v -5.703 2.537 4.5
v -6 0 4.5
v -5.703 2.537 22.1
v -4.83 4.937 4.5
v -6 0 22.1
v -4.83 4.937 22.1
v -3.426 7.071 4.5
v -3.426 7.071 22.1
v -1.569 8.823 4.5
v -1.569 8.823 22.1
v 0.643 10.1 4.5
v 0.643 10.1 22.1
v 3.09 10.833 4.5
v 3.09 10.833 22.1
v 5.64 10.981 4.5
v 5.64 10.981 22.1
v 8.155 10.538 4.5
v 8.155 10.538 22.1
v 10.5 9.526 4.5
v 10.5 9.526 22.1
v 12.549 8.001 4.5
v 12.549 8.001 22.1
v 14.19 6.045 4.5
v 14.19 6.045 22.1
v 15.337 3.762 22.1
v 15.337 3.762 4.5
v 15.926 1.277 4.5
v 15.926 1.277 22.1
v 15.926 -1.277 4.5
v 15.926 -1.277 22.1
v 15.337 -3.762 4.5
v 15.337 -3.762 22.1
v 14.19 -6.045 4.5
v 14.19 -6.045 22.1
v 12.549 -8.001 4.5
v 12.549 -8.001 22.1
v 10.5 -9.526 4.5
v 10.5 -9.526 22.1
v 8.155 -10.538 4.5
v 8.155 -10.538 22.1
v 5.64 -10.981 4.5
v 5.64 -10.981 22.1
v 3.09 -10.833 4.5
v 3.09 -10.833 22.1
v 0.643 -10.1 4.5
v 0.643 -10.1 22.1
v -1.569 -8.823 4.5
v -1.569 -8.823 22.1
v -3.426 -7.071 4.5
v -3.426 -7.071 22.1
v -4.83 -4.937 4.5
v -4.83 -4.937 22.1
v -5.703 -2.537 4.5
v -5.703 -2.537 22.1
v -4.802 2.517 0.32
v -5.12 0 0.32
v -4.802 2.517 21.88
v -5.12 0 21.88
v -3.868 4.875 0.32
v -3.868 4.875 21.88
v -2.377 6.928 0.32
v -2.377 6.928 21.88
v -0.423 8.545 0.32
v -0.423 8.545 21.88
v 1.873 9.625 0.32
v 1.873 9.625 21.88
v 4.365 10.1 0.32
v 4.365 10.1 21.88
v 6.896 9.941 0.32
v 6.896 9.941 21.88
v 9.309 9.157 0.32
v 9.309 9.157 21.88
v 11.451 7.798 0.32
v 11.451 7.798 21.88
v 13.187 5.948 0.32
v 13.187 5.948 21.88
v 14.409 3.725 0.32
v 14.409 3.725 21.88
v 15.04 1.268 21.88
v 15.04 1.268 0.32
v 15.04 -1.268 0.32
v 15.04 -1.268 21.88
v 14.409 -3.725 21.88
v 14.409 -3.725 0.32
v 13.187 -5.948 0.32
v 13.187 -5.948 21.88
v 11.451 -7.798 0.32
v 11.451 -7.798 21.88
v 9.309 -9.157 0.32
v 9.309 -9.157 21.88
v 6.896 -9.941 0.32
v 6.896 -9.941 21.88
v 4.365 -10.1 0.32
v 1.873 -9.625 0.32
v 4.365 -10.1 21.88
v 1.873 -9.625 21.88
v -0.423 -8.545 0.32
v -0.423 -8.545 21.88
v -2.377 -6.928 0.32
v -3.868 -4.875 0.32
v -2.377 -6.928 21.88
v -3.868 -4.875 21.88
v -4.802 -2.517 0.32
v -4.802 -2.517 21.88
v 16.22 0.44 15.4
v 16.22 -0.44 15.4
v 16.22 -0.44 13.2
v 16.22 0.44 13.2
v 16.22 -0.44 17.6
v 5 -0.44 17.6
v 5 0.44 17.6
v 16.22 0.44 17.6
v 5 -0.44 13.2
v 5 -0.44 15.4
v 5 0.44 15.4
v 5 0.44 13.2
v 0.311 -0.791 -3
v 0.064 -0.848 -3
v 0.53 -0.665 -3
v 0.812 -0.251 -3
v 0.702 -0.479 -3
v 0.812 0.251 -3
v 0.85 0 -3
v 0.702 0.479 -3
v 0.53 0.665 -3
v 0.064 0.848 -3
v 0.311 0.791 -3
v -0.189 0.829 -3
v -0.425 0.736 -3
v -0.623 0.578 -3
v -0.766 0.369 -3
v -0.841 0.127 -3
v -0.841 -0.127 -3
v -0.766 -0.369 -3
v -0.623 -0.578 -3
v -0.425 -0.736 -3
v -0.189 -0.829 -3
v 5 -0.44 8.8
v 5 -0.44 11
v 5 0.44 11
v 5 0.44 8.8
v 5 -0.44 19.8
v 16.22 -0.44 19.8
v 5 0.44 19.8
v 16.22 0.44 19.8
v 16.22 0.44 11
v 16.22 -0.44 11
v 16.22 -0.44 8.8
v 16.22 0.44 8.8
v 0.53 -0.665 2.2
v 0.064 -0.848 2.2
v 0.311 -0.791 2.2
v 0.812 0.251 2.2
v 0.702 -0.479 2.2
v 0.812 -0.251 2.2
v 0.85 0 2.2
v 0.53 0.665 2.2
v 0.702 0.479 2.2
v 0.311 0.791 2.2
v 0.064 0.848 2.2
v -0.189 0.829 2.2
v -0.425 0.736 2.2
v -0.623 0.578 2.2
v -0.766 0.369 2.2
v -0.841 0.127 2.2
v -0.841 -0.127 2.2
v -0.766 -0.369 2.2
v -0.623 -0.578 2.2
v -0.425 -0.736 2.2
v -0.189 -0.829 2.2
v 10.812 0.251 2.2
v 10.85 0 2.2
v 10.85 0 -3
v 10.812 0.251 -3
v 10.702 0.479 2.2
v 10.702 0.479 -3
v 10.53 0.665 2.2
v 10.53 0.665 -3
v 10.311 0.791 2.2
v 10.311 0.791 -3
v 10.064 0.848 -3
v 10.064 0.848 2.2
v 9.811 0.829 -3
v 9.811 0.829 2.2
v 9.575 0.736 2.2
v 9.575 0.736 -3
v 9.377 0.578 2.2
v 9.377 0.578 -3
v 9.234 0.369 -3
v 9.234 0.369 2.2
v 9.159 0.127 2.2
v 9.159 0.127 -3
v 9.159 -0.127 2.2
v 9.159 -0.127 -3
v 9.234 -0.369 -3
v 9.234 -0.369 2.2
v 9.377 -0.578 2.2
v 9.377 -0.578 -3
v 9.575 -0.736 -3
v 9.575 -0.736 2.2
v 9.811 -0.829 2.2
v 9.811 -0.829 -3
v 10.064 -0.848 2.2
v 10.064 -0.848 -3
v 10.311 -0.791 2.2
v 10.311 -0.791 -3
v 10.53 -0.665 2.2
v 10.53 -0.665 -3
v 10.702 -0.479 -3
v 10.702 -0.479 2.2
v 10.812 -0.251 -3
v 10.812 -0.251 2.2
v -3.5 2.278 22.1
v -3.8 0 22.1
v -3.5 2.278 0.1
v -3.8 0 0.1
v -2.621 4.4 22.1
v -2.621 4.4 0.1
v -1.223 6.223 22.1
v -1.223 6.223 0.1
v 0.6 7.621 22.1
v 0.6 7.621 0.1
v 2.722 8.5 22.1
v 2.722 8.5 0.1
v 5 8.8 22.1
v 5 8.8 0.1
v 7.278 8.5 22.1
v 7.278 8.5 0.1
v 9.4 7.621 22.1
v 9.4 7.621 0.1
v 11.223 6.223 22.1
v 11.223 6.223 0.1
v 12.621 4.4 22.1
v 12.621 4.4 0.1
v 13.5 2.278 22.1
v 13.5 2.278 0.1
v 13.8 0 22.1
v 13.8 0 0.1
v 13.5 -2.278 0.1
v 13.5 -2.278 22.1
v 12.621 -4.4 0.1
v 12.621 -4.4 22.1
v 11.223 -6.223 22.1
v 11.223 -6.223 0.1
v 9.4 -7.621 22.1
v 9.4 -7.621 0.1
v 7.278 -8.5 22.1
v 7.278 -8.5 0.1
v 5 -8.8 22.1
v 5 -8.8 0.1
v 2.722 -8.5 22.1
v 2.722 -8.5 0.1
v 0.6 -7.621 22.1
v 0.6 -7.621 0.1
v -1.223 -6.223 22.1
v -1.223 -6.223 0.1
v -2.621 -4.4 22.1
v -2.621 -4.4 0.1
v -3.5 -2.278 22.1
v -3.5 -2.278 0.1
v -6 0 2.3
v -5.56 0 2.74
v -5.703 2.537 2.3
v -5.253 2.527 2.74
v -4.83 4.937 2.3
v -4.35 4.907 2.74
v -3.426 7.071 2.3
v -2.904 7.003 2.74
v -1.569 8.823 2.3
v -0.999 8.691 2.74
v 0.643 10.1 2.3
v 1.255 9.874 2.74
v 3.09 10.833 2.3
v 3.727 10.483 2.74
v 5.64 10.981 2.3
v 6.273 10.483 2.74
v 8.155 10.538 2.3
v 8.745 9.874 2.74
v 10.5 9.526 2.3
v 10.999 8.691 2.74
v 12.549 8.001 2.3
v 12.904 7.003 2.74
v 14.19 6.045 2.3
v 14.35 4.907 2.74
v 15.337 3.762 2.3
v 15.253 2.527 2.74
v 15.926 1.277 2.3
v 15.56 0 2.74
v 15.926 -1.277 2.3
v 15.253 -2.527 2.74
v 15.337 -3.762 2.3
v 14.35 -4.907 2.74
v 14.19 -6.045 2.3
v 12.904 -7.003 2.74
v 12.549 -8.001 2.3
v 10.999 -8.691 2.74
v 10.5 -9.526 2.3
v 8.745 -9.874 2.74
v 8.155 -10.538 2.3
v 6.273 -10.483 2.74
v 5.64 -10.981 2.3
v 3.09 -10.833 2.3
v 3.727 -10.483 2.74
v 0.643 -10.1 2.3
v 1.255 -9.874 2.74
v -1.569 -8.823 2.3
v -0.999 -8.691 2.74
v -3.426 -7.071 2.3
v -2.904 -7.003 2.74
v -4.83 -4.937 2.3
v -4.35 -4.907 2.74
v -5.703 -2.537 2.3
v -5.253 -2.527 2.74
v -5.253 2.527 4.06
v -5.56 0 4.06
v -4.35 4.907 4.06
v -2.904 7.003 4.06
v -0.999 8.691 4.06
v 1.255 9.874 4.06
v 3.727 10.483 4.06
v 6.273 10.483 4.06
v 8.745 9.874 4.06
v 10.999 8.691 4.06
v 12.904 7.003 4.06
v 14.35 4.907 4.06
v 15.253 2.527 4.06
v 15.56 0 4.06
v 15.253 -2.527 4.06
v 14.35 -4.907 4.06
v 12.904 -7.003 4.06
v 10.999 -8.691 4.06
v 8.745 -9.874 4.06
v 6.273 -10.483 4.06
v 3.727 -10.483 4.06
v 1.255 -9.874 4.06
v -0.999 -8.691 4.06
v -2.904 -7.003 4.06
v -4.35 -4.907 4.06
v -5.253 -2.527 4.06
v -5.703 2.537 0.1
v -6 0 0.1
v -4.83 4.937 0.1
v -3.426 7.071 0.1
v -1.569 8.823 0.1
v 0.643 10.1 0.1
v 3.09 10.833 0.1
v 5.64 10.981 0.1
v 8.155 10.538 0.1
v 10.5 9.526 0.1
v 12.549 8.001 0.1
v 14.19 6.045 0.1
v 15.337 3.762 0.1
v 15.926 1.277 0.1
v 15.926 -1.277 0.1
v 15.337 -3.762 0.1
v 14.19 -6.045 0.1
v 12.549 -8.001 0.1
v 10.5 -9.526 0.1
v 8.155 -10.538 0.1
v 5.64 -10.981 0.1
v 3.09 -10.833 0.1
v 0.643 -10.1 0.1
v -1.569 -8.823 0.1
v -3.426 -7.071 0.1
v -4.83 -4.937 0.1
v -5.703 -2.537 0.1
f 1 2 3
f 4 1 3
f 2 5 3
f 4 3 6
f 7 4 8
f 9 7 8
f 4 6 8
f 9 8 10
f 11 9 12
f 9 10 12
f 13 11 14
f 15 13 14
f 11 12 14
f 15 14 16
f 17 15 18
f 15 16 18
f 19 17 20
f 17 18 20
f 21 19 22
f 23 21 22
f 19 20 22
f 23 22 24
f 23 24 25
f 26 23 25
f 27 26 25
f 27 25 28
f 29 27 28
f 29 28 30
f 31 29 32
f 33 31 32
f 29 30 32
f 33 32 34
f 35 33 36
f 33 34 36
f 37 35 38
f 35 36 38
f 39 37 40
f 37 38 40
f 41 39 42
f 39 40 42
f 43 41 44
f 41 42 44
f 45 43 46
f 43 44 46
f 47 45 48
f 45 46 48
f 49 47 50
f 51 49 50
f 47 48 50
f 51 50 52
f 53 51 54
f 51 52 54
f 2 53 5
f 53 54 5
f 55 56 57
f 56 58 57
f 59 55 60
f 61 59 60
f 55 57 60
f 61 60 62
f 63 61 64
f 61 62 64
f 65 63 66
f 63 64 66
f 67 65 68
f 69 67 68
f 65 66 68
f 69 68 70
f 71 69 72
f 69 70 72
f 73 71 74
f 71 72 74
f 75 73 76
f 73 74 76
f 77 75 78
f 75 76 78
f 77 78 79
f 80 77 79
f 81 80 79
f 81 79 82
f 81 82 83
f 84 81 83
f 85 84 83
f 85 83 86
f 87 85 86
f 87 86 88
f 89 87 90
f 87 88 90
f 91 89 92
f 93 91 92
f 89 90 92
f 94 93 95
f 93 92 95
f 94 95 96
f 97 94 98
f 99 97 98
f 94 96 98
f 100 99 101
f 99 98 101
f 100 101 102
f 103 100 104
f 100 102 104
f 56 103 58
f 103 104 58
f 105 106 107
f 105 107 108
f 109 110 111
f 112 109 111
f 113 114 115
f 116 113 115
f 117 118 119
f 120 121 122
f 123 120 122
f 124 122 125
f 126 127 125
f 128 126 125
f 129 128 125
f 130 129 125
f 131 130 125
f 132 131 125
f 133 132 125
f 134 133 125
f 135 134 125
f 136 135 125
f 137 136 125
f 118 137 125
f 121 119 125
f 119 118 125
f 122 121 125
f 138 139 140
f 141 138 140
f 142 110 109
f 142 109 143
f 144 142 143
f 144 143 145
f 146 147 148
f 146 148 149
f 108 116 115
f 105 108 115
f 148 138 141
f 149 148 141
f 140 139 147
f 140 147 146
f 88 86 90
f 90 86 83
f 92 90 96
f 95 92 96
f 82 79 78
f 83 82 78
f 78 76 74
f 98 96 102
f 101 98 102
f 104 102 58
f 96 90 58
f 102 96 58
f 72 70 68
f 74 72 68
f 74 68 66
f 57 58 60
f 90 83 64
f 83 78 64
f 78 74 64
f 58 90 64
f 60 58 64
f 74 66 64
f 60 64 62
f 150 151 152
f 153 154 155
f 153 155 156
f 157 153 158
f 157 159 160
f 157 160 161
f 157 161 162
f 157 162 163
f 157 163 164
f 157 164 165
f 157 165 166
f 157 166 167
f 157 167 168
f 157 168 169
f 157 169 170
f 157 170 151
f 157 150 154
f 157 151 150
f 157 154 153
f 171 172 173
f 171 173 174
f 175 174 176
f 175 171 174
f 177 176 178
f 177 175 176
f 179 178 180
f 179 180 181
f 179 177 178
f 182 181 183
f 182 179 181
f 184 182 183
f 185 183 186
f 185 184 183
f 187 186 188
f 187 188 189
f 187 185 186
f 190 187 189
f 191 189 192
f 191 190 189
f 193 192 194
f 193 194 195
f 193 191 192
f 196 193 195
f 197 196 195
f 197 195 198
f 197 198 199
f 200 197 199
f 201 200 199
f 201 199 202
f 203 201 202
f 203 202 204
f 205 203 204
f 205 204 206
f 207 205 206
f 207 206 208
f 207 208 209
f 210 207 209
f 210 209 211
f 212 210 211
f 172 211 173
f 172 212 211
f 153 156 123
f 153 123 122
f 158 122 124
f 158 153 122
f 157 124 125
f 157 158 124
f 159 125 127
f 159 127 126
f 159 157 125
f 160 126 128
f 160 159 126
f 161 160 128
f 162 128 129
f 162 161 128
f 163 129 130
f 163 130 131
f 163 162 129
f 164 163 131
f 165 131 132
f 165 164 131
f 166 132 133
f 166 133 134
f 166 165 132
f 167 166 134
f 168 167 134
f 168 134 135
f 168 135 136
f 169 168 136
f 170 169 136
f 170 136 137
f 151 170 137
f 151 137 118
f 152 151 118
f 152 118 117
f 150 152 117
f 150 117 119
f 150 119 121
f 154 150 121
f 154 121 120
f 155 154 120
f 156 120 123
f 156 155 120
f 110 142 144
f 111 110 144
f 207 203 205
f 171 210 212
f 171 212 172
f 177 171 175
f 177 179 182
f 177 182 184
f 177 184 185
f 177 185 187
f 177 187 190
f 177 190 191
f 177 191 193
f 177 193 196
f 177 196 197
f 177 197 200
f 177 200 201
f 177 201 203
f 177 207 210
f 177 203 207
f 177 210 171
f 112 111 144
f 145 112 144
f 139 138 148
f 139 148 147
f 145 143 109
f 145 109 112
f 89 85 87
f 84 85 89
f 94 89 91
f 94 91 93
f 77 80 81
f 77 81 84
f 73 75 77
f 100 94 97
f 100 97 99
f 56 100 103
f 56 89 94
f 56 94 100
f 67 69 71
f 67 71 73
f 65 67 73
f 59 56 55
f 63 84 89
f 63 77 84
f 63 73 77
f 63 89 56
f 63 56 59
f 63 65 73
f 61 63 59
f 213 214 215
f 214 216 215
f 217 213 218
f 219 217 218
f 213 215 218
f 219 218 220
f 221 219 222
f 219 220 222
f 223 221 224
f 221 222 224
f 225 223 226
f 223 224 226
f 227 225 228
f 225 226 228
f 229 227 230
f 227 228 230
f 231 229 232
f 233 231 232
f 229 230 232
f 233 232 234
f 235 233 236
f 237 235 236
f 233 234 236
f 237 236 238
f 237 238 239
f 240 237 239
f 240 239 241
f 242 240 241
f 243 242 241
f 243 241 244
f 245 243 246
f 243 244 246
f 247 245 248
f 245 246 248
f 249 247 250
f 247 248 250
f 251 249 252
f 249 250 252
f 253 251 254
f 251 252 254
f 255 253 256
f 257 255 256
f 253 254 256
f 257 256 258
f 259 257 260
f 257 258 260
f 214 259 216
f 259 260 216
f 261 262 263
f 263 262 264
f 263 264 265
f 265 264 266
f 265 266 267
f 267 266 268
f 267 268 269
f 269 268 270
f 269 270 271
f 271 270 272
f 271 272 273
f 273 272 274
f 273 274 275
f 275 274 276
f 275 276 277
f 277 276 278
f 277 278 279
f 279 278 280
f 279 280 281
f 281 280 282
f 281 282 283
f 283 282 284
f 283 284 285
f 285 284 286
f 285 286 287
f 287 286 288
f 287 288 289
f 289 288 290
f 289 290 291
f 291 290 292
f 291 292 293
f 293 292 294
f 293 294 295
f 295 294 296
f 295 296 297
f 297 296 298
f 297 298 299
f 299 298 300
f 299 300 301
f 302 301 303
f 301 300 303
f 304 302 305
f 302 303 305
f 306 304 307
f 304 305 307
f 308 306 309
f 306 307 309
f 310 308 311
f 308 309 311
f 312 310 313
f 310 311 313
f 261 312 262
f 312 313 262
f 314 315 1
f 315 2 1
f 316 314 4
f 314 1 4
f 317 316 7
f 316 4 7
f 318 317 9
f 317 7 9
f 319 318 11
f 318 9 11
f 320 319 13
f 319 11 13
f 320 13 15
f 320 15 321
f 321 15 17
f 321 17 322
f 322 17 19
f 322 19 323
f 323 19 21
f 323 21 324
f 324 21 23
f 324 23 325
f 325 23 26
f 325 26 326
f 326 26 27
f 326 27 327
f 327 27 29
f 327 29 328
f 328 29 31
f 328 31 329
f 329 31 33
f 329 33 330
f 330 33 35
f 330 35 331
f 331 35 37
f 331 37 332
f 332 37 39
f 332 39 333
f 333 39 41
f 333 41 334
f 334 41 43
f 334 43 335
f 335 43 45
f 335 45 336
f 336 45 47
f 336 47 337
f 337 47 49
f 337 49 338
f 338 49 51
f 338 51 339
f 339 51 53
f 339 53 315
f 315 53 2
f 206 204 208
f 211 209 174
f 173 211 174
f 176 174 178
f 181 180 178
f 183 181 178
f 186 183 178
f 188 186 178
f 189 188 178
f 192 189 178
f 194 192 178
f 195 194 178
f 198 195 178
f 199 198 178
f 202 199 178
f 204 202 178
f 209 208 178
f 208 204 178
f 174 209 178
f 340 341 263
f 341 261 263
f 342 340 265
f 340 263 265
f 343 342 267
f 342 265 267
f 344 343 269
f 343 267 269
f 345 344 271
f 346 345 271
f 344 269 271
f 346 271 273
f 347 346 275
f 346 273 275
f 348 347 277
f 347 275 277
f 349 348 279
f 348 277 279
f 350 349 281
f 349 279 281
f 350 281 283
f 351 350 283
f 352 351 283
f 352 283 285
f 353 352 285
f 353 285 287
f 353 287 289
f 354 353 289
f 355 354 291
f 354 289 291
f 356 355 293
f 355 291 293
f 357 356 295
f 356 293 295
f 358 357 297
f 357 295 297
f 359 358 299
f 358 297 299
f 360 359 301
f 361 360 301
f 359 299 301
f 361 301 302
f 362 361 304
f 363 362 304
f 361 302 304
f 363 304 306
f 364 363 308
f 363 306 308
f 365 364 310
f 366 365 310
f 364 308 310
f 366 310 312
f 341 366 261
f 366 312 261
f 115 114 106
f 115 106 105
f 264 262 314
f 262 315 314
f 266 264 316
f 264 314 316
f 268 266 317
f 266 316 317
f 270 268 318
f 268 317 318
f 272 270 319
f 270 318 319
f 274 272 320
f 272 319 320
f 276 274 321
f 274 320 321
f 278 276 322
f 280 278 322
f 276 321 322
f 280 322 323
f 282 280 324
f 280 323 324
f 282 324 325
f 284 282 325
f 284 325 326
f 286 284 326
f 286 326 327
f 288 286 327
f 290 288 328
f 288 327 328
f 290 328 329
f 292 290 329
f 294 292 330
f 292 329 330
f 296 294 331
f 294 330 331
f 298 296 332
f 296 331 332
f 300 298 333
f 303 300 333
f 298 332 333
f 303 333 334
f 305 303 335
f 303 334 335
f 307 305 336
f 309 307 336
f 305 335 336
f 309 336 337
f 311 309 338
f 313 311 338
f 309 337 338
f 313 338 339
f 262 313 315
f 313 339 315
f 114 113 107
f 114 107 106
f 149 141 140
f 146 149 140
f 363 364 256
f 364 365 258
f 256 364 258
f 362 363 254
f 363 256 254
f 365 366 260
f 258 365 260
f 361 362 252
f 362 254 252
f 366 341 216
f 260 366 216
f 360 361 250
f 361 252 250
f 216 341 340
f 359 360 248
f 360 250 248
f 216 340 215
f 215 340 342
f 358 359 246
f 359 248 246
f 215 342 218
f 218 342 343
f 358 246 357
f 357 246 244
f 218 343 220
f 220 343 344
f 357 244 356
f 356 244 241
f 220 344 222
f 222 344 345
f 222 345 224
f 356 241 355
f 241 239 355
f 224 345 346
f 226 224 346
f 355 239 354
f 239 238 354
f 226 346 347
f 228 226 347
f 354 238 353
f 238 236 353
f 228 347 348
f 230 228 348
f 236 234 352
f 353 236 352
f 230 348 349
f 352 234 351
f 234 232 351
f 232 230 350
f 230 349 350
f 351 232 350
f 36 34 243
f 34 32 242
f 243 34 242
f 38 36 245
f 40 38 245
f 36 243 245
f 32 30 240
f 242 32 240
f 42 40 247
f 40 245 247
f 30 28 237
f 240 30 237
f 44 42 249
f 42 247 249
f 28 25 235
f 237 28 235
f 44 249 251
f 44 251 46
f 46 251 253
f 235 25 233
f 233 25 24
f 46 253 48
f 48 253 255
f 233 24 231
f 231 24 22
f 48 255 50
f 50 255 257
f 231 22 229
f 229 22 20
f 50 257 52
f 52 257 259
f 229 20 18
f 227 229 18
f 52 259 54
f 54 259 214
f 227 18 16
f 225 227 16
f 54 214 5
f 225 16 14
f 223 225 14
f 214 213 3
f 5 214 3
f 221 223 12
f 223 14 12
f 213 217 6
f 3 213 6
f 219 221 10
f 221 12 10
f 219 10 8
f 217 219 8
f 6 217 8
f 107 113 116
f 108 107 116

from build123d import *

# Parameters (mm, degrees)
SKETCH002_W  = 10.12
SKETCH002_H  = 21.56
SKETCH003_R  = 0.85
PAD_DEPTH    = 5.2
SKETCH004_W  = 0.88
SKETCH004_H  = 2.2
PAD001_DEPTH = 11.22


with BuildPart() as revolution:
    # Sketch → Revolution (revolve)
    with BuildSketch(Plane.XZ):
        Polygon((-6, 0.1), (-6, 2.3), (-5.56, 2.74), (-5.56, 4.06), (-6, 4.5), (-6, 22.1), (-3.8, 22.1), (-3.8, 0.1), align=None)
    revolve(axis=Axis((5, 0, 7.548619), (0, 0, -1)))


with BuildPart() as revolution001:
    # Sketch002 → Revolution001 (revolve)
    with BuildSketch(Plane.XZ):
        with Locations((-0.06, 11.1)):
            Rectangle(SKETCH002_W, SKETCH002_H)
    revolve(axis=Axis((5, 0, 4.680116), (0, 0, -1)))


with BuildPart() as pad:
    # Sketch003 → Pad (new body)
    with BuildSketch(Plane.XY.offset(2.2)):
        Circle(SKETCH003_R)
        with Locations((10, 0)):
            Circle(SKETCH003_R)
    extrude(amount=-PAD_DEPTH)


with BuildPart() as pad001:
    # Sketch004 → Pad001 (new body)
    with BuildSketch(Plane.YZ.offset(5)):
        with Locations((0, 9.9)):
            Rectangle(SKETCH004_W, SKETCH004_H)
        with Locations((0, 14.3)):
            Rectangle(SKETCH004_W, SKETCH004_H)
        with Locations((0, 18.7)):
            Rectangle(SKETCH004_W, SKETCH004_H)
    extrude(amount=PAD001_DEPTH)


solid = Compound([revolution.part, revolution001.part, pad.part, pad001.part])
